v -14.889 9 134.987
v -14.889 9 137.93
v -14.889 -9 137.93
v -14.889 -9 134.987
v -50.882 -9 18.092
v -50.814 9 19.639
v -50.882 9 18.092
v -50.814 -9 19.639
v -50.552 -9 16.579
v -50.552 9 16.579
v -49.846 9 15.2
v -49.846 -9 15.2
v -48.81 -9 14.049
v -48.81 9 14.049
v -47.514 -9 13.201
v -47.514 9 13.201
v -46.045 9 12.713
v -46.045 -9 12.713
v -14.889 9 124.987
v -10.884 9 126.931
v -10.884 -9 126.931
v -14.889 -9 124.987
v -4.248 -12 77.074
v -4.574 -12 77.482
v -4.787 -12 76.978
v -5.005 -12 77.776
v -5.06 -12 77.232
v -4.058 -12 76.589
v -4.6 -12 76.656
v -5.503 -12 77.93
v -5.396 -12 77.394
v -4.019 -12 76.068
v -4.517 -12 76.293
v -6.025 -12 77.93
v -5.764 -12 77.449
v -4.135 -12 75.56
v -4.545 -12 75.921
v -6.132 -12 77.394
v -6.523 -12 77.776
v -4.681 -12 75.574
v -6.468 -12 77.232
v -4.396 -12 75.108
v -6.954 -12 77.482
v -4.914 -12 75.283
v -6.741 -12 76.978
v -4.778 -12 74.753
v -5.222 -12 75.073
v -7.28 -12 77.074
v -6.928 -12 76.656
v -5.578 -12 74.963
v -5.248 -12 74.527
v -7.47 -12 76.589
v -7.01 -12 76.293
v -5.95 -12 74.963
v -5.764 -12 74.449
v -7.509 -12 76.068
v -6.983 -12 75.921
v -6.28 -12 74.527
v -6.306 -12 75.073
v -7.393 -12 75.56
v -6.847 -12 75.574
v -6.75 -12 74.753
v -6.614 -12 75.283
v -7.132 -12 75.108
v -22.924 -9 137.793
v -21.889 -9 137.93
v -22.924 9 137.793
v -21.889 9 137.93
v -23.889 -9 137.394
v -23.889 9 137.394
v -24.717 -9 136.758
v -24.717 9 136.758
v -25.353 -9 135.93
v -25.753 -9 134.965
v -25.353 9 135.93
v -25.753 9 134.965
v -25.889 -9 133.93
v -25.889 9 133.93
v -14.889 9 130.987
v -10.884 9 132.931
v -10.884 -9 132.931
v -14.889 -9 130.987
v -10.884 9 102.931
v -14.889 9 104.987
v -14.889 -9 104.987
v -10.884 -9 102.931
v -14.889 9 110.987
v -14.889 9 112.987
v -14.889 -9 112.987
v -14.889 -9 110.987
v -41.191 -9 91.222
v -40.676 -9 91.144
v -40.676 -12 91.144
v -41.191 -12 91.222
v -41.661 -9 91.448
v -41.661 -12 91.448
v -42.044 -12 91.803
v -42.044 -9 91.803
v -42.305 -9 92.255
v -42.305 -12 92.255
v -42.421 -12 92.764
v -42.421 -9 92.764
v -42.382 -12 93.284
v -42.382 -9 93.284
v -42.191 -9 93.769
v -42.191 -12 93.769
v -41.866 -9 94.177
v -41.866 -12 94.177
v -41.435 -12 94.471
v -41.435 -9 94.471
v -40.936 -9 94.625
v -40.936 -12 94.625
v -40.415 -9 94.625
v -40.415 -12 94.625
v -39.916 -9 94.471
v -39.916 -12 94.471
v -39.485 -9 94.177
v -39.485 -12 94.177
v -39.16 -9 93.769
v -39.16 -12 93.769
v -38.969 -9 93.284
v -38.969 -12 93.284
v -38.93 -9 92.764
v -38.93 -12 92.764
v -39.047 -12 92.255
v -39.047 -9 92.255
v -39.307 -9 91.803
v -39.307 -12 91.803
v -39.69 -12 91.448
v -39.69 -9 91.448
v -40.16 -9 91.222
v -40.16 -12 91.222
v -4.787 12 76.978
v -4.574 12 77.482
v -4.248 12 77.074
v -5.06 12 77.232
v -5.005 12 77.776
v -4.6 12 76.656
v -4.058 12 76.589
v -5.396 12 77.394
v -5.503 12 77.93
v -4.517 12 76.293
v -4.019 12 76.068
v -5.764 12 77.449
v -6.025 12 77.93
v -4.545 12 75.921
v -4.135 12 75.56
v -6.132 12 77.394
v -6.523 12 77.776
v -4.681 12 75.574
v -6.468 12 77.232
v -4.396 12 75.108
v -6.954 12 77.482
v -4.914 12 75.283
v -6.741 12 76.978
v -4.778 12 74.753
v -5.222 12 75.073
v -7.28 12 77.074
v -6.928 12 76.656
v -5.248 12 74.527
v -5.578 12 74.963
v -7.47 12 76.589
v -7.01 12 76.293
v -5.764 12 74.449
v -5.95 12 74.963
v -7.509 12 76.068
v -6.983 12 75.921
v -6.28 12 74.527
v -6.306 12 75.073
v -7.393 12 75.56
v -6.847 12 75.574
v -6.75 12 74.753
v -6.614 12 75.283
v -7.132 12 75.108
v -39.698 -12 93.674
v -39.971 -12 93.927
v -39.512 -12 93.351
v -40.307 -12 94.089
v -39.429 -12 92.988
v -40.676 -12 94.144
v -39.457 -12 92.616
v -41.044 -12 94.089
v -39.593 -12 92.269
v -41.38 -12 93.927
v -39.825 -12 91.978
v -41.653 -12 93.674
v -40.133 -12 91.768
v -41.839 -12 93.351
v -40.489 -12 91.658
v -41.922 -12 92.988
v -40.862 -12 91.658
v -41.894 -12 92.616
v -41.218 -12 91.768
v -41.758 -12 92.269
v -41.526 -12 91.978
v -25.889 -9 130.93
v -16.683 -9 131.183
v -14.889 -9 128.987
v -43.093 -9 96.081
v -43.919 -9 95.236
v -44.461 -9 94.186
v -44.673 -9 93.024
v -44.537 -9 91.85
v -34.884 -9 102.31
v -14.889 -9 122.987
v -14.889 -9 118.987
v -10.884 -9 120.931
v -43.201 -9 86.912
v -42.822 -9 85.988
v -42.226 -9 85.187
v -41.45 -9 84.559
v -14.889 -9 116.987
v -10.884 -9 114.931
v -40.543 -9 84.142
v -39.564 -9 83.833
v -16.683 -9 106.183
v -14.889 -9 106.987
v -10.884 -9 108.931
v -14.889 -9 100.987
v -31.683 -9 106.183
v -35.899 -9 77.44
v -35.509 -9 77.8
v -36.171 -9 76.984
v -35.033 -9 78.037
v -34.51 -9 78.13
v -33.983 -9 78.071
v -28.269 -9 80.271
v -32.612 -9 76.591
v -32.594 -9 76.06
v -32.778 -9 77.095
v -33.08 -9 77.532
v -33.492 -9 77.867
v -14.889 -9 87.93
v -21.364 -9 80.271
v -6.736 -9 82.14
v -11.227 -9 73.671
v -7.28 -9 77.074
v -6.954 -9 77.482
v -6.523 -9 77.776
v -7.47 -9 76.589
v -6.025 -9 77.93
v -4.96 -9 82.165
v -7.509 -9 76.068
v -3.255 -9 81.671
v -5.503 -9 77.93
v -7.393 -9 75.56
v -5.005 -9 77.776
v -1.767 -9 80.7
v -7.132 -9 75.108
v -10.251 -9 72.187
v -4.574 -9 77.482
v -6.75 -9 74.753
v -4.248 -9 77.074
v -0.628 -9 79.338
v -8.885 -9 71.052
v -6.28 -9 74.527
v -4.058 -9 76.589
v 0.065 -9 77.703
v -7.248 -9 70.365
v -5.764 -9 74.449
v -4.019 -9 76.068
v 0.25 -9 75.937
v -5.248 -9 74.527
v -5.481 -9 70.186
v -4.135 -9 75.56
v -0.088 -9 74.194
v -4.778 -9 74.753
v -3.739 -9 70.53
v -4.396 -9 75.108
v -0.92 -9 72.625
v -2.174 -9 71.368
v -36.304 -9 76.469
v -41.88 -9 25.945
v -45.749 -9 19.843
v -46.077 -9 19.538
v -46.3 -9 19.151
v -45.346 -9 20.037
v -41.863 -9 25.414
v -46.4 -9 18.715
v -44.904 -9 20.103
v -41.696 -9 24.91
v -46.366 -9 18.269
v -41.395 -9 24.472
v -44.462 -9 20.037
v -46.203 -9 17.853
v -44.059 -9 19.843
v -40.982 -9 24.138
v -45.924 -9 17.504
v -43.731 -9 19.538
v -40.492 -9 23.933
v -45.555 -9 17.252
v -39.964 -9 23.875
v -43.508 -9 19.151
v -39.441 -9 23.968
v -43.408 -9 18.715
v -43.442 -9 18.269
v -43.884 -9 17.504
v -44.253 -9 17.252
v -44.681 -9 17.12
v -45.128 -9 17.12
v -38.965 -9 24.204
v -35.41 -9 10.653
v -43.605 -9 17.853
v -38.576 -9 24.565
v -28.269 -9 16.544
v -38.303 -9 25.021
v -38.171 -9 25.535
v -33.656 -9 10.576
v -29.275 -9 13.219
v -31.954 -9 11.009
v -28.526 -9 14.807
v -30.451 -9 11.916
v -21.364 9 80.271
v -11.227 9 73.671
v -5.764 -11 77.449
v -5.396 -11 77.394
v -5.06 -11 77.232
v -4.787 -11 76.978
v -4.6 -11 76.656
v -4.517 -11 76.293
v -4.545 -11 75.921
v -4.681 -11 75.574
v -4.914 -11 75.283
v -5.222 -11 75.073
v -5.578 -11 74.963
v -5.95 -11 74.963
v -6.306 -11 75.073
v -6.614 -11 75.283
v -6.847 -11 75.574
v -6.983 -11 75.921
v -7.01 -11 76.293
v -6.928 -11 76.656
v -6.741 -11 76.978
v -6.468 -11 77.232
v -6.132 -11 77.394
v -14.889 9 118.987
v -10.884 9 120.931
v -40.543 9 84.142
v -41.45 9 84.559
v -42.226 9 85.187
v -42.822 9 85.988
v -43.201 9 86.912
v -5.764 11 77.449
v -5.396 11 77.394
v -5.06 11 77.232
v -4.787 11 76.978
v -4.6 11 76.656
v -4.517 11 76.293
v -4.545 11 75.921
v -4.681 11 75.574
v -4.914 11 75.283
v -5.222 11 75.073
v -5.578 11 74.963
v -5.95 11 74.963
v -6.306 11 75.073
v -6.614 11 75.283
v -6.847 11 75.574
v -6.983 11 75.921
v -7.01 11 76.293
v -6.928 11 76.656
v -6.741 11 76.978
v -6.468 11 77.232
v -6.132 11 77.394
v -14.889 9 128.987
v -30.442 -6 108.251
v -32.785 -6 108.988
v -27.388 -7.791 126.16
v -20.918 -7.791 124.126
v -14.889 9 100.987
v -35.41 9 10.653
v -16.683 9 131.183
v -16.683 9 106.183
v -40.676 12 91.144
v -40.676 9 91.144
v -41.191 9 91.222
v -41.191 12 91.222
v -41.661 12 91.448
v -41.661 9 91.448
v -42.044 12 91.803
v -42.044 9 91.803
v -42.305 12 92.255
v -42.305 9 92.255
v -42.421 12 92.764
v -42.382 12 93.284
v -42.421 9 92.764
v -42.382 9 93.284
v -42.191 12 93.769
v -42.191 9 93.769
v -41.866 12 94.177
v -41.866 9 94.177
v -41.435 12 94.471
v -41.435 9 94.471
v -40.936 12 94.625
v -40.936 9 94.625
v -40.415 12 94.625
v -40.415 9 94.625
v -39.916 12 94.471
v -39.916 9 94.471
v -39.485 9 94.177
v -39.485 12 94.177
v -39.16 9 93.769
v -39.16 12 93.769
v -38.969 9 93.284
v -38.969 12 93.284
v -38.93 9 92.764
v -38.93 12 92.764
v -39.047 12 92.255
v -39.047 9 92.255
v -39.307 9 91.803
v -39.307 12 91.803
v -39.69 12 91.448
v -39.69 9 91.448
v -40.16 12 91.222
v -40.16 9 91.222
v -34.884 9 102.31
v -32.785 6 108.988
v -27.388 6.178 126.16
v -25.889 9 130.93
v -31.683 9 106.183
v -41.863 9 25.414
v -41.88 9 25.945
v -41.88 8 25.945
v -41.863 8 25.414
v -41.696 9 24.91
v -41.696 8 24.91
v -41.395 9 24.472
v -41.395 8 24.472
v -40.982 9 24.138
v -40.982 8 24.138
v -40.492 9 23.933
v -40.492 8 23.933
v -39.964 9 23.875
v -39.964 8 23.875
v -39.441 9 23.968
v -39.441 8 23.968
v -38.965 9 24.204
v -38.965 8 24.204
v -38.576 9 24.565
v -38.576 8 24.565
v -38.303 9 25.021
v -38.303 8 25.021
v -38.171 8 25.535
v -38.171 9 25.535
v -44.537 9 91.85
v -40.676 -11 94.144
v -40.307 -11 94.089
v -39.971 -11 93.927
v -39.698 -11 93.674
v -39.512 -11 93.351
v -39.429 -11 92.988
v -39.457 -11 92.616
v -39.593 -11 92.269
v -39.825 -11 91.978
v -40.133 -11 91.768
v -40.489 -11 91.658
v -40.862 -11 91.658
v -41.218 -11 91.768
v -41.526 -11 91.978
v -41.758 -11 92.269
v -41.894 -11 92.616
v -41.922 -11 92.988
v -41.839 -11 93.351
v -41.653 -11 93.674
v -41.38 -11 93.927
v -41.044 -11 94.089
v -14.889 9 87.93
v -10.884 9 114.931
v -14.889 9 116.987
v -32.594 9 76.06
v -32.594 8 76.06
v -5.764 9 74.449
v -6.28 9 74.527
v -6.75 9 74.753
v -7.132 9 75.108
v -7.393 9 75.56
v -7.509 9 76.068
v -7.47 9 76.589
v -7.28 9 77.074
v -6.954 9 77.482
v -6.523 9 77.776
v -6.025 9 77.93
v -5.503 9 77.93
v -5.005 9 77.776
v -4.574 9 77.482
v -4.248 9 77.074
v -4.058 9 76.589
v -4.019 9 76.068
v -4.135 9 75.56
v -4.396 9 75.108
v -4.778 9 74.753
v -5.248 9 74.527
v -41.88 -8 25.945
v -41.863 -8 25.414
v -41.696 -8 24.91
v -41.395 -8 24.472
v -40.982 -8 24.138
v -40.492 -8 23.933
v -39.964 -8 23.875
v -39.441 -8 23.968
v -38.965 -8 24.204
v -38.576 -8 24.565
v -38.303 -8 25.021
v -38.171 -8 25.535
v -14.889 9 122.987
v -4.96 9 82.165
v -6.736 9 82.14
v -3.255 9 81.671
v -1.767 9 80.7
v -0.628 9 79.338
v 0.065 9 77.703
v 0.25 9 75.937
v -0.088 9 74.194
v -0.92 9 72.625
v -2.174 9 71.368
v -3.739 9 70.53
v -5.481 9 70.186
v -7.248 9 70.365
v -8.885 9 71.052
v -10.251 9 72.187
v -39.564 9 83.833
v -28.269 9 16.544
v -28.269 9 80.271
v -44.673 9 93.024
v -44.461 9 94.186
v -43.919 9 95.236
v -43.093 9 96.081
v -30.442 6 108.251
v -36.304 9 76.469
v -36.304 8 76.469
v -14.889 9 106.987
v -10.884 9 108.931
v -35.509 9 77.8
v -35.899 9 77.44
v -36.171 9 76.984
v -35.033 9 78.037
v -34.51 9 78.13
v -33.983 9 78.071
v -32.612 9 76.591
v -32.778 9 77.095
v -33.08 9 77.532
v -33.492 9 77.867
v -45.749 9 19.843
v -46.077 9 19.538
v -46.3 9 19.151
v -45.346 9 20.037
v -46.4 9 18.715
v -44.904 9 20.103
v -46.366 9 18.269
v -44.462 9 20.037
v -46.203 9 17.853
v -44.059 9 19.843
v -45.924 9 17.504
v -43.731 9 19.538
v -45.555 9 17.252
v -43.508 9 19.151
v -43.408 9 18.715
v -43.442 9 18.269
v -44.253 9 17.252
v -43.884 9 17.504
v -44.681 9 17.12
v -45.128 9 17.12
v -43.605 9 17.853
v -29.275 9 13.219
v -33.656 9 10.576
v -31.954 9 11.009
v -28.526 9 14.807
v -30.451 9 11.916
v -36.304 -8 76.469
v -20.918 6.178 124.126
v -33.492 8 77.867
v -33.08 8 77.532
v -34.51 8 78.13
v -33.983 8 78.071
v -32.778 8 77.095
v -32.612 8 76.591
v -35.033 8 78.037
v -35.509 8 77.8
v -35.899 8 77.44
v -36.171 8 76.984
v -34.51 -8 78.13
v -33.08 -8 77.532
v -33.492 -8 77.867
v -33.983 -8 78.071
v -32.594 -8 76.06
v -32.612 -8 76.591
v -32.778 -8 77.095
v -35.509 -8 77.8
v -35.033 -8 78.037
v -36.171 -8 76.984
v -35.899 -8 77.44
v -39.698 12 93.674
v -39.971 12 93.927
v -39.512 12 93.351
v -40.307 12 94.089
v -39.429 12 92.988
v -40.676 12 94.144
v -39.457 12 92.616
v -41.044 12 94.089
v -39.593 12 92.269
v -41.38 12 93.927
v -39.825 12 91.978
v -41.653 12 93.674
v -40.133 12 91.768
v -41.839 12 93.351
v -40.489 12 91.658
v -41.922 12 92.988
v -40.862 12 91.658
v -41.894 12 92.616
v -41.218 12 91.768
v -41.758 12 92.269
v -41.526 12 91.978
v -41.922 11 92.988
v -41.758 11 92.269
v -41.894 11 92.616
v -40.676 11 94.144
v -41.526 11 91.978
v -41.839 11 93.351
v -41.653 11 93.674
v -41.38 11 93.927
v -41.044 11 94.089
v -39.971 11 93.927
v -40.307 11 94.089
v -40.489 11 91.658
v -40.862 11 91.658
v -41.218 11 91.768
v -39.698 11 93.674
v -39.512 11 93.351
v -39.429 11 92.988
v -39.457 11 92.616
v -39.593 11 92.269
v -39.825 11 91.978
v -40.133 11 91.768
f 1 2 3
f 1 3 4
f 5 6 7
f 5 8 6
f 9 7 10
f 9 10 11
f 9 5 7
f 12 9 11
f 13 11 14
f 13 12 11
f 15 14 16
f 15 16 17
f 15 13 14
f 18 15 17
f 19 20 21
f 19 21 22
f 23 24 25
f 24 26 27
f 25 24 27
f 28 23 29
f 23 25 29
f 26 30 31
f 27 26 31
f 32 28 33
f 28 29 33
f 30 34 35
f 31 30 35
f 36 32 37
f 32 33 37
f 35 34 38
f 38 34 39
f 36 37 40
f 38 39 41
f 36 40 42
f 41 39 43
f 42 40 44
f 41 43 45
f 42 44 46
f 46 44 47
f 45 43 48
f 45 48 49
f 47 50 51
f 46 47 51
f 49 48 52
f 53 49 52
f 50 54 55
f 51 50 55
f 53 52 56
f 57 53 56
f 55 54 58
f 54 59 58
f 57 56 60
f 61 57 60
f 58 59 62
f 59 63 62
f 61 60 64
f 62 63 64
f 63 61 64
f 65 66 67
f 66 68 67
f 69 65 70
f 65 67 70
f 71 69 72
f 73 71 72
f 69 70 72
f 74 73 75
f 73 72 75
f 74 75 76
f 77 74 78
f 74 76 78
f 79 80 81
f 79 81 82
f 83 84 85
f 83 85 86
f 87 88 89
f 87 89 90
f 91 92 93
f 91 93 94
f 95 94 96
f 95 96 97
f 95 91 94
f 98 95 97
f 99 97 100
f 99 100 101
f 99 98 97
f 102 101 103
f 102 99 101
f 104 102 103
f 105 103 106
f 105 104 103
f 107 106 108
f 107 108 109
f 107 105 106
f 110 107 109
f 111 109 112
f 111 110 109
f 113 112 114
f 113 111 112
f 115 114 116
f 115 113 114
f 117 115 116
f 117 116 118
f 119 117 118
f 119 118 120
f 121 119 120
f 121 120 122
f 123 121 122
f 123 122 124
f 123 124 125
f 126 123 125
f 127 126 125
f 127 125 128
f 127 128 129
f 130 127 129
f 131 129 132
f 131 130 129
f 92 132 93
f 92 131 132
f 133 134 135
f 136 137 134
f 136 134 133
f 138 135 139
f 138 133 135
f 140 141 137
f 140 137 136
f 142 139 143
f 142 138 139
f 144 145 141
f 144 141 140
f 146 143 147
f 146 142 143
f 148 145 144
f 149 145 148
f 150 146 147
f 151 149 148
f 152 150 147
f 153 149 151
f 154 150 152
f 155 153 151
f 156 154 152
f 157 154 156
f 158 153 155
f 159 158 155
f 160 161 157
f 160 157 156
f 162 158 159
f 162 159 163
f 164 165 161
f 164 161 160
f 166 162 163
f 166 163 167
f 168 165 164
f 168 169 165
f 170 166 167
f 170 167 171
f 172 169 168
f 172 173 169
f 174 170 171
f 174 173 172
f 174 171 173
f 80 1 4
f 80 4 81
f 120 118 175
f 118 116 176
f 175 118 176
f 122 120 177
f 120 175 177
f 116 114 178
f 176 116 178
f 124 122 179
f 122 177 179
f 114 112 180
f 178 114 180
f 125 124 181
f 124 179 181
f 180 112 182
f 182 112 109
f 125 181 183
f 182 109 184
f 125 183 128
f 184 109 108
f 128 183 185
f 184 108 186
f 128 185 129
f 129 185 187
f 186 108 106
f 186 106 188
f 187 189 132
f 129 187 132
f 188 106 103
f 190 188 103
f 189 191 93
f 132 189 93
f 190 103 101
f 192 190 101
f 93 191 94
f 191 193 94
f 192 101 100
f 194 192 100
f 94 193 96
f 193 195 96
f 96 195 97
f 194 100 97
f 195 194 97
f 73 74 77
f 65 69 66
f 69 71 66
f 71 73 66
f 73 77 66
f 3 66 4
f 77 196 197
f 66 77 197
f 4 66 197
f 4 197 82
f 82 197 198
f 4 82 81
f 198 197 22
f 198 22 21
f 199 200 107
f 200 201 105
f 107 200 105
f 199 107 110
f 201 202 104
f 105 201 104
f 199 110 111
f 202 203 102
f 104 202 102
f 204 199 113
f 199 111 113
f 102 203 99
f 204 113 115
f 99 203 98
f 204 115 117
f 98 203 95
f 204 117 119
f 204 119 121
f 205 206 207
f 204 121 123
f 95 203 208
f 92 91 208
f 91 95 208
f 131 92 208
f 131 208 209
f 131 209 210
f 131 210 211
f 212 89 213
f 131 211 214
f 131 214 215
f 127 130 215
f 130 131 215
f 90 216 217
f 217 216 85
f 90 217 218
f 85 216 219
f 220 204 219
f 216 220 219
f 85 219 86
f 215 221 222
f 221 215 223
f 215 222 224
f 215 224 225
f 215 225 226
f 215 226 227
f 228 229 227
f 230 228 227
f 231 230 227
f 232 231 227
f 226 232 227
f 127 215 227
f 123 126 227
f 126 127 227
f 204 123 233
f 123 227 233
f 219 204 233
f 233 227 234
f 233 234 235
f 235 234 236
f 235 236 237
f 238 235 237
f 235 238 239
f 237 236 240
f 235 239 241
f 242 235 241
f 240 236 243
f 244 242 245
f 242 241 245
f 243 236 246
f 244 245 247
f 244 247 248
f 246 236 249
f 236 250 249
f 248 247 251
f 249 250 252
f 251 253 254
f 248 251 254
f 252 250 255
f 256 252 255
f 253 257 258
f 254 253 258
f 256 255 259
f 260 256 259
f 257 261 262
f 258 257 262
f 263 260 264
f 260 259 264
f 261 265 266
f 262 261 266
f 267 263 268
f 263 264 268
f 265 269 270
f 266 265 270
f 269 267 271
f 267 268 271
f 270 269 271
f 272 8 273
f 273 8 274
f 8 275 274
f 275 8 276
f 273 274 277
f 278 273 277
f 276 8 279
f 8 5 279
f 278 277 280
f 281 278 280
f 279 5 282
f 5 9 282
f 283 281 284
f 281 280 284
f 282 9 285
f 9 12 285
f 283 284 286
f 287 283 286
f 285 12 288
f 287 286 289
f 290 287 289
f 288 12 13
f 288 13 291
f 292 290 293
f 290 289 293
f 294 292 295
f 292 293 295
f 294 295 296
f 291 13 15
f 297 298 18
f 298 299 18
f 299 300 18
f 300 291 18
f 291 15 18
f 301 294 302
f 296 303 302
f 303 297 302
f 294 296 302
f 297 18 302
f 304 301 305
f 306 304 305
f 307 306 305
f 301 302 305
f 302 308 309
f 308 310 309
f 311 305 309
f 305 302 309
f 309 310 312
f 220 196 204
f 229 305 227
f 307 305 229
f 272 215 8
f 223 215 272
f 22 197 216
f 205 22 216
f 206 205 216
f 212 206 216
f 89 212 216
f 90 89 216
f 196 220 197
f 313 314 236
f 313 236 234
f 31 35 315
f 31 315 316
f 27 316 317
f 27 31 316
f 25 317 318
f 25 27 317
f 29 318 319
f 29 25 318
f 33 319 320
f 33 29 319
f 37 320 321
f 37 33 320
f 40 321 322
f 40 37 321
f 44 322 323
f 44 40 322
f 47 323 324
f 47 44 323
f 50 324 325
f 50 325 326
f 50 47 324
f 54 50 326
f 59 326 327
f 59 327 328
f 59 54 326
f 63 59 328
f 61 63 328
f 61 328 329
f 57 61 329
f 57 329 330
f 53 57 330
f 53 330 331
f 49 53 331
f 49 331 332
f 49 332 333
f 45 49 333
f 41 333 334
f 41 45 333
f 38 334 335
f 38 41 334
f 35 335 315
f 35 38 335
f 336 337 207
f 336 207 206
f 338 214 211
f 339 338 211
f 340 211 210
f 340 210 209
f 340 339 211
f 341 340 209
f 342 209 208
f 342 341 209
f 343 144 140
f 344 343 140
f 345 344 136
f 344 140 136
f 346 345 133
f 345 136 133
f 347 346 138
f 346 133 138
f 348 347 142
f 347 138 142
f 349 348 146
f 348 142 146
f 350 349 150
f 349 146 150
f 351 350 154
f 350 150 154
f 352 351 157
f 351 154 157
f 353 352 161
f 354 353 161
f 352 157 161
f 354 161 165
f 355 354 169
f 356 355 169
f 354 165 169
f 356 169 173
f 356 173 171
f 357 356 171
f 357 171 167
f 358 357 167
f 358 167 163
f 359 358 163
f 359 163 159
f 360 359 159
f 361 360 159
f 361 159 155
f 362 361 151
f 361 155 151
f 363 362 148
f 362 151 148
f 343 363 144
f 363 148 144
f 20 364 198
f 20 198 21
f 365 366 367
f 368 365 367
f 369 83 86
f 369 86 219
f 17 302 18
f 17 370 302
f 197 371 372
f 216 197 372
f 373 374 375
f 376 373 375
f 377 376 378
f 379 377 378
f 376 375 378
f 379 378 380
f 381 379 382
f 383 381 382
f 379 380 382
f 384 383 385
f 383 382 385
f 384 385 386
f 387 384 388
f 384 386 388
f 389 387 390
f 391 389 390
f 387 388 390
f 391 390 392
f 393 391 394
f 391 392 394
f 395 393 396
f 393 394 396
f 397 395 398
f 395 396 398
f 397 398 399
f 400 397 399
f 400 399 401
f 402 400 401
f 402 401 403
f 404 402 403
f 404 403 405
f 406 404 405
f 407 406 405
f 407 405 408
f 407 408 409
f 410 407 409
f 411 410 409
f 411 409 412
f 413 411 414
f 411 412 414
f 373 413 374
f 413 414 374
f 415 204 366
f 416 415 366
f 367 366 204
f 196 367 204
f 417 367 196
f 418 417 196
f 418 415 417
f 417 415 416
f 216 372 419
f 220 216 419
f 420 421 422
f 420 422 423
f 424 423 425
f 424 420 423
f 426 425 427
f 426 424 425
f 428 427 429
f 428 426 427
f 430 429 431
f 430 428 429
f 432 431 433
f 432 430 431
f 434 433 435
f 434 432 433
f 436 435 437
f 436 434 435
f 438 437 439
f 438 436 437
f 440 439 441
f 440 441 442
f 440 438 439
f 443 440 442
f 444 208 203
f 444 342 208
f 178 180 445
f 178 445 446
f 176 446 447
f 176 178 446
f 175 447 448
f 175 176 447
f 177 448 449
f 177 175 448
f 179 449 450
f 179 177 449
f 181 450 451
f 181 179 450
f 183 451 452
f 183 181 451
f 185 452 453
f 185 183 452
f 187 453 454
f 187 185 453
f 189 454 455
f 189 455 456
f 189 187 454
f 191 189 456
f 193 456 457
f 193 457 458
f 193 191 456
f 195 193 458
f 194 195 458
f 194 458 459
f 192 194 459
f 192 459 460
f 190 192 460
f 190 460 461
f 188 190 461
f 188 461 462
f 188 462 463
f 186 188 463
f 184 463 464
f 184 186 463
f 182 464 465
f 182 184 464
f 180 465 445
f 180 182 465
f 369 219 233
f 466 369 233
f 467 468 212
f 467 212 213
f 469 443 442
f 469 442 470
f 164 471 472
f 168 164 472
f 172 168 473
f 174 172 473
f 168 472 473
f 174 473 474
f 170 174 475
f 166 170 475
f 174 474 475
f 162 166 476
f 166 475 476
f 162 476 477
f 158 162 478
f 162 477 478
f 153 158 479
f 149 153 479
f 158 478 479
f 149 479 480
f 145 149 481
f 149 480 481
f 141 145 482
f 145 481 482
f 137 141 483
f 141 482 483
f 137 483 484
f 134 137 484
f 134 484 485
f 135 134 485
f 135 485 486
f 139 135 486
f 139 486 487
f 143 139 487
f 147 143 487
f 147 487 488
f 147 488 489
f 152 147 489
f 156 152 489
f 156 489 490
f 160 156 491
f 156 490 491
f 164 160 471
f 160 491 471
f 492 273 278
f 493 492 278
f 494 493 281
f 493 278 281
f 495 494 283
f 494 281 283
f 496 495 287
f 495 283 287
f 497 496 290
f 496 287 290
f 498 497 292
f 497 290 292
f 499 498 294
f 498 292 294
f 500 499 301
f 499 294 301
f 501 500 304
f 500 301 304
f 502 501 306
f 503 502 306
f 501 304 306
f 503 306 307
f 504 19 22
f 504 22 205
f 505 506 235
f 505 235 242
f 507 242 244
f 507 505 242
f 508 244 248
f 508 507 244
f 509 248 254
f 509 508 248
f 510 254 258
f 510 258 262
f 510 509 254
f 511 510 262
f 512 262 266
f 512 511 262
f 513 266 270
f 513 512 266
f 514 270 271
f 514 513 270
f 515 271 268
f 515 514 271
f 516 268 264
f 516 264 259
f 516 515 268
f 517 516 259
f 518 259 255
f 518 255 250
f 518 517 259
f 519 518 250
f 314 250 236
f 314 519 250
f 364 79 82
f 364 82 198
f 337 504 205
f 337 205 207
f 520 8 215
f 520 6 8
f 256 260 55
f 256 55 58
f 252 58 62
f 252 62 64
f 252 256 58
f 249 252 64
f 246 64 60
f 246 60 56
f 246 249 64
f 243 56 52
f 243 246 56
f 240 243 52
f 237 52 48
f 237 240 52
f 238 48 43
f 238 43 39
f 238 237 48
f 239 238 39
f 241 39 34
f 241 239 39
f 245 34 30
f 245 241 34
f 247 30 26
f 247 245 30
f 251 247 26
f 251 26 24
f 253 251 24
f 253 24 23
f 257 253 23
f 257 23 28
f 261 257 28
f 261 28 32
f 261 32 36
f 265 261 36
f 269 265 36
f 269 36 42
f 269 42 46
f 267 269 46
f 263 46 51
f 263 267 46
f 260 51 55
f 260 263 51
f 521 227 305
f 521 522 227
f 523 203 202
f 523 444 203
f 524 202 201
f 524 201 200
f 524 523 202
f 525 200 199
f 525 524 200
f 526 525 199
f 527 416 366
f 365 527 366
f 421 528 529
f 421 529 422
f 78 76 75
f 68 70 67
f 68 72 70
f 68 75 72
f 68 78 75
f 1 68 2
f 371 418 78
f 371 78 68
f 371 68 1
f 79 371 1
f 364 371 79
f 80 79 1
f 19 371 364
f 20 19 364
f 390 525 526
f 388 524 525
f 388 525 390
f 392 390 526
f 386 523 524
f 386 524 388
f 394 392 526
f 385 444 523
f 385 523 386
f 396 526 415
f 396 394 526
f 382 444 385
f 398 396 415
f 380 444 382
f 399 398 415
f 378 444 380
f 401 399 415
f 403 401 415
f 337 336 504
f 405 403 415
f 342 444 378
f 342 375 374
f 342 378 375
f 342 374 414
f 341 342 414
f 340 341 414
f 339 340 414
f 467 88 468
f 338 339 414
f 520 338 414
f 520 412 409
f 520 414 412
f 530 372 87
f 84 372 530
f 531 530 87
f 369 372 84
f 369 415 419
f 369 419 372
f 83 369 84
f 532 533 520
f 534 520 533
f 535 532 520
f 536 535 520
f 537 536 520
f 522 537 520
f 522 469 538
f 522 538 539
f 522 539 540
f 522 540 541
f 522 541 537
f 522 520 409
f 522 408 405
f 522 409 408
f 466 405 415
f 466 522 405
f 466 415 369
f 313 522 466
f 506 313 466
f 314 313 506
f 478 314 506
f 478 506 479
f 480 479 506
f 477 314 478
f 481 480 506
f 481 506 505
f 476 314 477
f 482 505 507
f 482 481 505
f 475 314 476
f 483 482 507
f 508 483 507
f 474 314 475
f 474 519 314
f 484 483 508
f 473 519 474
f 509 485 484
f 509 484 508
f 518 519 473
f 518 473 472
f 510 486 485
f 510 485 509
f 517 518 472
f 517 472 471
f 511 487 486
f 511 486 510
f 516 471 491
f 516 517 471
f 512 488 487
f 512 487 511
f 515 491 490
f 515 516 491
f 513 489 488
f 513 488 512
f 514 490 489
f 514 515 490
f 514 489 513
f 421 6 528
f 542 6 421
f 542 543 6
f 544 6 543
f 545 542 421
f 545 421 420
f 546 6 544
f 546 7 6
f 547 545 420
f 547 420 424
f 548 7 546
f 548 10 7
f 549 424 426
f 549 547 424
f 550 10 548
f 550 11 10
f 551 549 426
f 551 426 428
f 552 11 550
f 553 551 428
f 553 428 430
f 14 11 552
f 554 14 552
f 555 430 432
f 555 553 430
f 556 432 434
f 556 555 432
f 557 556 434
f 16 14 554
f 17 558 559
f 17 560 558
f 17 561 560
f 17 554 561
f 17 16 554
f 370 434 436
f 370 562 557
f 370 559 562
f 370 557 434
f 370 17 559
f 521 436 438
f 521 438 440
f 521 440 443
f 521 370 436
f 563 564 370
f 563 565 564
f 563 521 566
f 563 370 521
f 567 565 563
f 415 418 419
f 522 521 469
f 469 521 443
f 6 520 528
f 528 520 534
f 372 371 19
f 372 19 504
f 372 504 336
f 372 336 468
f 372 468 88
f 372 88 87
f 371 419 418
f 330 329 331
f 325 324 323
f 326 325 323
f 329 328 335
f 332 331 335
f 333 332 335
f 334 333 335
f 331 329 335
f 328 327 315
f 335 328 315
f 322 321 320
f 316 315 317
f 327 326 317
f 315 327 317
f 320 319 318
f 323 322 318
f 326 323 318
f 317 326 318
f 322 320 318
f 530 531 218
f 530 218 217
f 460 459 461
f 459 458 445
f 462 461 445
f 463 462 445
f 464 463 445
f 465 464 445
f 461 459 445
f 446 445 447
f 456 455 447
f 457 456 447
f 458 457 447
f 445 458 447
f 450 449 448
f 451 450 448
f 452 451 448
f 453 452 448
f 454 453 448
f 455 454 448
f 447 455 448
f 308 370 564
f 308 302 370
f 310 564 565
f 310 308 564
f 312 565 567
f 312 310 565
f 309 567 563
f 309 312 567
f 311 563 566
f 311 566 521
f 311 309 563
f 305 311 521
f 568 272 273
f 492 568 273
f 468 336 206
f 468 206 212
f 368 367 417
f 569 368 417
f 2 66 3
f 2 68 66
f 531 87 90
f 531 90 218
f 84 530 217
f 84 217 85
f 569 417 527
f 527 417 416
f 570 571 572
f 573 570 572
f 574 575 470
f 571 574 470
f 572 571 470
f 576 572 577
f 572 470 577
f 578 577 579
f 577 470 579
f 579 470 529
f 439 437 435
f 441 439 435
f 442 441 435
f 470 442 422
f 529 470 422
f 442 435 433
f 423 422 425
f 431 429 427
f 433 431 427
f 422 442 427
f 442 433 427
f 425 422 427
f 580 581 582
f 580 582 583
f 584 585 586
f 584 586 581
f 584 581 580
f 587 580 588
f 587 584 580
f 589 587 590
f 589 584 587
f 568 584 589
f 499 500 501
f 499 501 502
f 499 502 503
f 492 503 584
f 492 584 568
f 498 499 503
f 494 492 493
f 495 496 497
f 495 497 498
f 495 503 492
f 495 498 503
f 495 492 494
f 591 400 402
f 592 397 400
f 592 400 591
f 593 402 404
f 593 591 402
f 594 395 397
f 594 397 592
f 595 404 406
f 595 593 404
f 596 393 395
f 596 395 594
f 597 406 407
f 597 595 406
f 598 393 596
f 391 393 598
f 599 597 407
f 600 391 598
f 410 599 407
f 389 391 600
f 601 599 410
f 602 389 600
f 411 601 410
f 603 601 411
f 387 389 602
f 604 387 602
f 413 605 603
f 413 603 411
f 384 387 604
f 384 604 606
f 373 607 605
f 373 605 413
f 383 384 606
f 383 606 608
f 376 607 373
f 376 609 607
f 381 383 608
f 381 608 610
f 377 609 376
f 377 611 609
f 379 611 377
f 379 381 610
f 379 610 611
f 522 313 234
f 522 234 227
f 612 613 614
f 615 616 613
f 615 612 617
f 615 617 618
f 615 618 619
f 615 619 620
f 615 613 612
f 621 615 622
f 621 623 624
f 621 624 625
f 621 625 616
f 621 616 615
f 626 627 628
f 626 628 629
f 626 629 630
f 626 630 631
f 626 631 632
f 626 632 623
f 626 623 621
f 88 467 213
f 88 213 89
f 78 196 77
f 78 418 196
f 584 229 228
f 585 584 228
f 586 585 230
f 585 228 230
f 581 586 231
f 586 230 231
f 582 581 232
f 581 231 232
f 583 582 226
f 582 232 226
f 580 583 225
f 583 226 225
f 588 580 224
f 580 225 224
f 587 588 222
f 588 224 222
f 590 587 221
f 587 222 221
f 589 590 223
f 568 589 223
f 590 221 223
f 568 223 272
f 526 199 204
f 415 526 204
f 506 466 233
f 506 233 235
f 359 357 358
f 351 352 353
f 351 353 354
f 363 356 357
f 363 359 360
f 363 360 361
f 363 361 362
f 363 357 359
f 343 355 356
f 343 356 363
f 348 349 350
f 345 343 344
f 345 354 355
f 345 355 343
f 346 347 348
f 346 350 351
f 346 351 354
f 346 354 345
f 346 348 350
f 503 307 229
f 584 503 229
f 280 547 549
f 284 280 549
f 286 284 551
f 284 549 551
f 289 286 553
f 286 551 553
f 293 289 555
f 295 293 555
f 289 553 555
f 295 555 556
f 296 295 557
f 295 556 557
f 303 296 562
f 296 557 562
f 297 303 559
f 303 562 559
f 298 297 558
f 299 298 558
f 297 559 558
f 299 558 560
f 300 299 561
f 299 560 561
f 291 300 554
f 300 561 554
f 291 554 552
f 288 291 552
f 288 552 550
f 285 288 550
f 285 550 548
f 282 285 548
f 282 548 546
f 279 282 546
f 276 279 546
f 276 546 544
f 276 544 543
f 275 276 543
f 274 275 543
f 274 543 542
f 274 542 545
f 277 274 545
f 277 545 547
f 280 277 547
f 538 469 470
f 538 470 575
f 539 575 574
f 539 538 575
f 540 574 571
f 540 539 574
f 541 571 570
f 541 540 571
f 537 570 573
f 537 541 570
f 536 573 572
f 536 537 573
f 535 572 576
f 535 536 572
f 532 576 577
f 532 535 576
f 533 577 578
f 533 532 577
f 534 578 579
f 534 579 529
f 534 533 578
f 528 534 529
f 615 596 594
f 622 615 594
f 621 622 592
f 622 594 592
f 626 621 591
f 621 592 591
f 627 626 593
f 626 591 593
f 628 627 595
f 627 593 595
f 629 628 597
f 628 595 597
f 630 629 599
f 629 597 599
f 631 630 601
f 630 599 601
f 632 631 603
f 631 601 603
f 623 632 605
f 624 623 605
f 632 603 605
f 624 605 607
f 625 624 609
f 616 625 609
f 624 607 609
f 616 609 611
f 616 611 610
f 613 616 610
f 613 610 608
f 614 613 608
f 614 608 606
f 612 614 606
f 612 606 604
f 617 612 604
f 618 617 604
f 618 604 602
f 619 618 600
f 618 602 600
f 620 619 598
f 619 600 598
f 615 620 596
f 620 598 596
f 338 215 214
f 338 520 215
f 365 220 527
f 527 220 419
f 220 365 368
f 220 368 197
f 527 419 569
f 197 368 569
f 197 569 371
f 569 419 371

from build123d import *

# Parameters (mm, degrees)
BOSS_EXTRUDE1_DEPTH = 9
FILLET1_R           = 6
FILLET2_R           = 4
BOSS_EXTRUDE2_DEPTH = 18
LPATTERN1_COUNT     = 6
LPATTERN1_PITCH     = 6
CUT_EXTRUDE1_DEPTH  = 149.120803233
CUT_EXTRUDE2_DEPTH  = 8
SKETCH6_R           = 1.5
CUT_EXTRUDE3_DEPTH  = 149.120803233
SKETCH7_R           = 1.75
BOSS_EXTRUDE3_DEPTH = 3
SKETCH9_R           = 1.25
CUT_EXTRUDE4_DEPTH  = 1
SKETCH10_R          = 1.25
CUT_EXTRUDE5_DEPTH  = 1
CUT_EXTRUDE7_DEPTH  = 1


with BuildPart() as part:
    # Sketch2 → Boss-Extrude1 (new, symmetric)
    with BuildSketch(Plane(origin=(0, 0, 0), x_dir=(1, 0, 0), z_dir=(0, 1, 0))):
        with BuildLine():
            Line((-39.563995826, -83.832935468), (-42.630019208, -84.799815256))
            Line((-42.630019208, -84.799815256), (-45.240501853, -94.451735935))
            Line((-45.240501853, -94.451735935), (-34.884360154, -102.309873698))
            Line((-34.884360154, -102.309873698), (-25.888982114, -130.929502869))
            Line((-25.888982114, -130.929502869), (-25.888982114, -137.929502869))
            Line((-25.888982114, -137.929502869), (-14.888982114, -137.929502869))
            Line((-14.888982114, -137.929502869), (-14.888982114, -87.929502869))
            Line((-14.888982114, -87.929502869), (-6.735604792, -82.139646373))
            ThreePointArc((-6.735604792, -82.139646373), (-0.446003435, -73.378982845), (-11.226689216, -73.670744316))
            Line((-11.226689216, -73.670744316), (-21.363708344, -80.271037279))
            Line((-21.363708344, -80.271037279), (-28.269041415, -80.271037279))
            Line((-28.269041415, -80.271037279), (-28.269041415, -9.271037279))
            Line((-28.269041415, -9.271037279), (-51.831492155, -13.832935468))
            Line((-51.831492155, -13.832935468), (-39.563995826, -83.832935468))
        make_face()
    extrude(amount=BOSS_EXTRUDE1_DEPTH, both=True)

    # Fillet1
    fillet1_edges = [part.edges().sort_by_distance(p)[0] for p in [
        (-51.831492155, 0, 13.832935468),
        (-28.269041415, 0, 9.271037279),
    ]]
    fillet(fillet1_edges, radius=FILLET1_R)

    # Fillet2
    fillet2_edges = [part.edges().sort_by_distance(p)[0] for p in [
        (-42.630019208, 0, 84.799815256),
        (-25.888982114, 0, 137.929502869),
        (-45.240501853, 0, 94.451735935),
    ]]
    fillet(fillet2_edges, radius=FILLET2_R)

    # Sketch3 → Boss-Extrude2 (add)
    with BuildSketch(Plane(origin=(0, 9, 0), x_dir=(1, 0, 0), z_dir=(0, 1, 0))):
        Polygon((-14.888982114, -130.986597937), (-14.888982114, -134.986597937), (-10.884332588, -132.931354664), align=None)
    boss_extrude2 = extrude(amount=-BOSS_EXTRUDE2_DEPTH)

    # LPattern1: Boss-Extrude2 ×6
    with Locations(*[(0, 0, -i * LPATTERN1_PITCH) for i in range(1, LPATTERN1_COUNT)]):
        add(boss_extrude2)

    # Sketch4 → Cut-Extrude1 (cut, through all)
    with BuildSketch(Plane(origin=(0, 9, 0), x_dir=(1, 0, 0), z_dir=(0, 1, 0))):
        Polygon((-16.683079676, -131.183487283), (-16.683079676, -106.183487283), (-31.683079676, -106.183487283), align=None)
    extrude(amount=-CUT_EXTRUDE1_DEPTH, mode=Mode.SUBTRACT)

    # Sketch5 → Cut-Extrude2 (cut)
    with BuildSketch(Plane(origin=(-61.013660914, 0, 19.177080956), x_dir=(0.29984593468383275, 0, 0.9539876390465334), z_dir=(-0.9539876390465333, 0, 0.2998459346838327))):
        Polygon((94.142421284, 6), (94.142421284, -6), (112.142421284, -7.790586592), (112.142421284, 6.177981397), align=None)
    extrude(amount=-CUT_EXTRUDE2_DEPTH, mode=Mode.SUBTRACT)

    # Sketch6 → Cut-Extrude3 (cut, through all)
    with BuildSketch(Plane(origin=(0, 9, 0), x_dir=(1, 0, 0), z_dir=(0, 1, 0))):
        with Locations(Location((-44.904072418, -18.603144546, 0), (0, 0, 270))):
            Circle(SKETCH6_R)
    extrude(amount=-CUT_EXTRUDE3_DEPTH, mode=Mode.SUBTRACT)

    # Sketch7 → Boss-Extrude3 (add)
    with BuildSketch(Plane(origin=(0, 9, 0), x_dir=(1, 0, 0), z_dir=(0, 1, 0))):
        with Locations(Location((-40.67557748, -92.894380322, 0), (0, 0, 90))):
            Circle(SKETCH7_R)
        with Locations(Location((-5.76397205, -76.199117717, 0), (0, 0, 90))):
            Circle(SKETCH7_R)
    boss_extrude3 = extrude(amount=BOSS_EXTRUDE3_DEPTH)

    # Sketch9 → Cut-Extrude4 (cut)
    with BuildSketch(Plane(origin=(0, 12, 0), x_dir=(1, 0, 0), z_dir=(0, 1, 0))):
        with Locations(Location((-40.67557748, -92.894380322, 0), (0, 0, 270))):
            Circle(SKETCH9_R)
    cut_extrude4 = extrude(amount=-CUT_EXTRUDE4_DEPTH, mode=Mode.SUBTRACT)

    # Sketch10 → Cut-Extrude5 (cut)
    with BuildSketch(Plane(origin=(0, 12, 0), x_dir=(1, 0, 0), z_dir=(0, 1, 0))):
        with Locations(Location((-5.76397205, -76.199117717, 0), (0, 0, 270))):
            Circle(SKETCH10_R)
    cut_extrude5 = extrude(amount=-CUT_EXTRUDE5_DEPTH, mode=Mode.SUBTRACT)

    # Sketch11 → Cut-Extrude7 (cut)
    with BuildSketch(Plane(origin=(0, 9, 0), x_dir=(1, 0, 0), z_dir=(0, 1, 0))):
        with BuildLine():
            Line((-38.170562816, -25.535404597), (-32.594288437, -76.059830025))
            ThreePointArc((-32.594288437, -76.059830025), (-34.244390745, -78.119356213), (-36.303916933, -76.469253906))
            Line((-36.303916933, -76.469253906), (-41.880191311, -25.944828478))
            ThreePointArc((-41.880191311, -25.944828478), (-40.230089004, -23.88530229), (-38.170562816, -25.535404597))
        make_face()
    cut_extrude7 = extrude(amount=-CUT_EXTRUDE7_DEPTH, mode=Mode.SUBTRACT)

    # Mirror1: Boss-Extrude3, Cut-Extrude4, Cut-Extrude5, Cut-Extrude7 across plane
    add(boss_extrude3.mirror(Plane.ZX))
    add(cut_extrude4.mirror(Plane.ZX), mode=Mode.SUBTRACT)
    add(cut_extrude5.mirror(Plane.ZX), mode=Mode.SUBTRACT)
    add(cut_extrude7.mirror(Plane.ZX), mode=Mode.SUBTRACT)


solid = part.part
